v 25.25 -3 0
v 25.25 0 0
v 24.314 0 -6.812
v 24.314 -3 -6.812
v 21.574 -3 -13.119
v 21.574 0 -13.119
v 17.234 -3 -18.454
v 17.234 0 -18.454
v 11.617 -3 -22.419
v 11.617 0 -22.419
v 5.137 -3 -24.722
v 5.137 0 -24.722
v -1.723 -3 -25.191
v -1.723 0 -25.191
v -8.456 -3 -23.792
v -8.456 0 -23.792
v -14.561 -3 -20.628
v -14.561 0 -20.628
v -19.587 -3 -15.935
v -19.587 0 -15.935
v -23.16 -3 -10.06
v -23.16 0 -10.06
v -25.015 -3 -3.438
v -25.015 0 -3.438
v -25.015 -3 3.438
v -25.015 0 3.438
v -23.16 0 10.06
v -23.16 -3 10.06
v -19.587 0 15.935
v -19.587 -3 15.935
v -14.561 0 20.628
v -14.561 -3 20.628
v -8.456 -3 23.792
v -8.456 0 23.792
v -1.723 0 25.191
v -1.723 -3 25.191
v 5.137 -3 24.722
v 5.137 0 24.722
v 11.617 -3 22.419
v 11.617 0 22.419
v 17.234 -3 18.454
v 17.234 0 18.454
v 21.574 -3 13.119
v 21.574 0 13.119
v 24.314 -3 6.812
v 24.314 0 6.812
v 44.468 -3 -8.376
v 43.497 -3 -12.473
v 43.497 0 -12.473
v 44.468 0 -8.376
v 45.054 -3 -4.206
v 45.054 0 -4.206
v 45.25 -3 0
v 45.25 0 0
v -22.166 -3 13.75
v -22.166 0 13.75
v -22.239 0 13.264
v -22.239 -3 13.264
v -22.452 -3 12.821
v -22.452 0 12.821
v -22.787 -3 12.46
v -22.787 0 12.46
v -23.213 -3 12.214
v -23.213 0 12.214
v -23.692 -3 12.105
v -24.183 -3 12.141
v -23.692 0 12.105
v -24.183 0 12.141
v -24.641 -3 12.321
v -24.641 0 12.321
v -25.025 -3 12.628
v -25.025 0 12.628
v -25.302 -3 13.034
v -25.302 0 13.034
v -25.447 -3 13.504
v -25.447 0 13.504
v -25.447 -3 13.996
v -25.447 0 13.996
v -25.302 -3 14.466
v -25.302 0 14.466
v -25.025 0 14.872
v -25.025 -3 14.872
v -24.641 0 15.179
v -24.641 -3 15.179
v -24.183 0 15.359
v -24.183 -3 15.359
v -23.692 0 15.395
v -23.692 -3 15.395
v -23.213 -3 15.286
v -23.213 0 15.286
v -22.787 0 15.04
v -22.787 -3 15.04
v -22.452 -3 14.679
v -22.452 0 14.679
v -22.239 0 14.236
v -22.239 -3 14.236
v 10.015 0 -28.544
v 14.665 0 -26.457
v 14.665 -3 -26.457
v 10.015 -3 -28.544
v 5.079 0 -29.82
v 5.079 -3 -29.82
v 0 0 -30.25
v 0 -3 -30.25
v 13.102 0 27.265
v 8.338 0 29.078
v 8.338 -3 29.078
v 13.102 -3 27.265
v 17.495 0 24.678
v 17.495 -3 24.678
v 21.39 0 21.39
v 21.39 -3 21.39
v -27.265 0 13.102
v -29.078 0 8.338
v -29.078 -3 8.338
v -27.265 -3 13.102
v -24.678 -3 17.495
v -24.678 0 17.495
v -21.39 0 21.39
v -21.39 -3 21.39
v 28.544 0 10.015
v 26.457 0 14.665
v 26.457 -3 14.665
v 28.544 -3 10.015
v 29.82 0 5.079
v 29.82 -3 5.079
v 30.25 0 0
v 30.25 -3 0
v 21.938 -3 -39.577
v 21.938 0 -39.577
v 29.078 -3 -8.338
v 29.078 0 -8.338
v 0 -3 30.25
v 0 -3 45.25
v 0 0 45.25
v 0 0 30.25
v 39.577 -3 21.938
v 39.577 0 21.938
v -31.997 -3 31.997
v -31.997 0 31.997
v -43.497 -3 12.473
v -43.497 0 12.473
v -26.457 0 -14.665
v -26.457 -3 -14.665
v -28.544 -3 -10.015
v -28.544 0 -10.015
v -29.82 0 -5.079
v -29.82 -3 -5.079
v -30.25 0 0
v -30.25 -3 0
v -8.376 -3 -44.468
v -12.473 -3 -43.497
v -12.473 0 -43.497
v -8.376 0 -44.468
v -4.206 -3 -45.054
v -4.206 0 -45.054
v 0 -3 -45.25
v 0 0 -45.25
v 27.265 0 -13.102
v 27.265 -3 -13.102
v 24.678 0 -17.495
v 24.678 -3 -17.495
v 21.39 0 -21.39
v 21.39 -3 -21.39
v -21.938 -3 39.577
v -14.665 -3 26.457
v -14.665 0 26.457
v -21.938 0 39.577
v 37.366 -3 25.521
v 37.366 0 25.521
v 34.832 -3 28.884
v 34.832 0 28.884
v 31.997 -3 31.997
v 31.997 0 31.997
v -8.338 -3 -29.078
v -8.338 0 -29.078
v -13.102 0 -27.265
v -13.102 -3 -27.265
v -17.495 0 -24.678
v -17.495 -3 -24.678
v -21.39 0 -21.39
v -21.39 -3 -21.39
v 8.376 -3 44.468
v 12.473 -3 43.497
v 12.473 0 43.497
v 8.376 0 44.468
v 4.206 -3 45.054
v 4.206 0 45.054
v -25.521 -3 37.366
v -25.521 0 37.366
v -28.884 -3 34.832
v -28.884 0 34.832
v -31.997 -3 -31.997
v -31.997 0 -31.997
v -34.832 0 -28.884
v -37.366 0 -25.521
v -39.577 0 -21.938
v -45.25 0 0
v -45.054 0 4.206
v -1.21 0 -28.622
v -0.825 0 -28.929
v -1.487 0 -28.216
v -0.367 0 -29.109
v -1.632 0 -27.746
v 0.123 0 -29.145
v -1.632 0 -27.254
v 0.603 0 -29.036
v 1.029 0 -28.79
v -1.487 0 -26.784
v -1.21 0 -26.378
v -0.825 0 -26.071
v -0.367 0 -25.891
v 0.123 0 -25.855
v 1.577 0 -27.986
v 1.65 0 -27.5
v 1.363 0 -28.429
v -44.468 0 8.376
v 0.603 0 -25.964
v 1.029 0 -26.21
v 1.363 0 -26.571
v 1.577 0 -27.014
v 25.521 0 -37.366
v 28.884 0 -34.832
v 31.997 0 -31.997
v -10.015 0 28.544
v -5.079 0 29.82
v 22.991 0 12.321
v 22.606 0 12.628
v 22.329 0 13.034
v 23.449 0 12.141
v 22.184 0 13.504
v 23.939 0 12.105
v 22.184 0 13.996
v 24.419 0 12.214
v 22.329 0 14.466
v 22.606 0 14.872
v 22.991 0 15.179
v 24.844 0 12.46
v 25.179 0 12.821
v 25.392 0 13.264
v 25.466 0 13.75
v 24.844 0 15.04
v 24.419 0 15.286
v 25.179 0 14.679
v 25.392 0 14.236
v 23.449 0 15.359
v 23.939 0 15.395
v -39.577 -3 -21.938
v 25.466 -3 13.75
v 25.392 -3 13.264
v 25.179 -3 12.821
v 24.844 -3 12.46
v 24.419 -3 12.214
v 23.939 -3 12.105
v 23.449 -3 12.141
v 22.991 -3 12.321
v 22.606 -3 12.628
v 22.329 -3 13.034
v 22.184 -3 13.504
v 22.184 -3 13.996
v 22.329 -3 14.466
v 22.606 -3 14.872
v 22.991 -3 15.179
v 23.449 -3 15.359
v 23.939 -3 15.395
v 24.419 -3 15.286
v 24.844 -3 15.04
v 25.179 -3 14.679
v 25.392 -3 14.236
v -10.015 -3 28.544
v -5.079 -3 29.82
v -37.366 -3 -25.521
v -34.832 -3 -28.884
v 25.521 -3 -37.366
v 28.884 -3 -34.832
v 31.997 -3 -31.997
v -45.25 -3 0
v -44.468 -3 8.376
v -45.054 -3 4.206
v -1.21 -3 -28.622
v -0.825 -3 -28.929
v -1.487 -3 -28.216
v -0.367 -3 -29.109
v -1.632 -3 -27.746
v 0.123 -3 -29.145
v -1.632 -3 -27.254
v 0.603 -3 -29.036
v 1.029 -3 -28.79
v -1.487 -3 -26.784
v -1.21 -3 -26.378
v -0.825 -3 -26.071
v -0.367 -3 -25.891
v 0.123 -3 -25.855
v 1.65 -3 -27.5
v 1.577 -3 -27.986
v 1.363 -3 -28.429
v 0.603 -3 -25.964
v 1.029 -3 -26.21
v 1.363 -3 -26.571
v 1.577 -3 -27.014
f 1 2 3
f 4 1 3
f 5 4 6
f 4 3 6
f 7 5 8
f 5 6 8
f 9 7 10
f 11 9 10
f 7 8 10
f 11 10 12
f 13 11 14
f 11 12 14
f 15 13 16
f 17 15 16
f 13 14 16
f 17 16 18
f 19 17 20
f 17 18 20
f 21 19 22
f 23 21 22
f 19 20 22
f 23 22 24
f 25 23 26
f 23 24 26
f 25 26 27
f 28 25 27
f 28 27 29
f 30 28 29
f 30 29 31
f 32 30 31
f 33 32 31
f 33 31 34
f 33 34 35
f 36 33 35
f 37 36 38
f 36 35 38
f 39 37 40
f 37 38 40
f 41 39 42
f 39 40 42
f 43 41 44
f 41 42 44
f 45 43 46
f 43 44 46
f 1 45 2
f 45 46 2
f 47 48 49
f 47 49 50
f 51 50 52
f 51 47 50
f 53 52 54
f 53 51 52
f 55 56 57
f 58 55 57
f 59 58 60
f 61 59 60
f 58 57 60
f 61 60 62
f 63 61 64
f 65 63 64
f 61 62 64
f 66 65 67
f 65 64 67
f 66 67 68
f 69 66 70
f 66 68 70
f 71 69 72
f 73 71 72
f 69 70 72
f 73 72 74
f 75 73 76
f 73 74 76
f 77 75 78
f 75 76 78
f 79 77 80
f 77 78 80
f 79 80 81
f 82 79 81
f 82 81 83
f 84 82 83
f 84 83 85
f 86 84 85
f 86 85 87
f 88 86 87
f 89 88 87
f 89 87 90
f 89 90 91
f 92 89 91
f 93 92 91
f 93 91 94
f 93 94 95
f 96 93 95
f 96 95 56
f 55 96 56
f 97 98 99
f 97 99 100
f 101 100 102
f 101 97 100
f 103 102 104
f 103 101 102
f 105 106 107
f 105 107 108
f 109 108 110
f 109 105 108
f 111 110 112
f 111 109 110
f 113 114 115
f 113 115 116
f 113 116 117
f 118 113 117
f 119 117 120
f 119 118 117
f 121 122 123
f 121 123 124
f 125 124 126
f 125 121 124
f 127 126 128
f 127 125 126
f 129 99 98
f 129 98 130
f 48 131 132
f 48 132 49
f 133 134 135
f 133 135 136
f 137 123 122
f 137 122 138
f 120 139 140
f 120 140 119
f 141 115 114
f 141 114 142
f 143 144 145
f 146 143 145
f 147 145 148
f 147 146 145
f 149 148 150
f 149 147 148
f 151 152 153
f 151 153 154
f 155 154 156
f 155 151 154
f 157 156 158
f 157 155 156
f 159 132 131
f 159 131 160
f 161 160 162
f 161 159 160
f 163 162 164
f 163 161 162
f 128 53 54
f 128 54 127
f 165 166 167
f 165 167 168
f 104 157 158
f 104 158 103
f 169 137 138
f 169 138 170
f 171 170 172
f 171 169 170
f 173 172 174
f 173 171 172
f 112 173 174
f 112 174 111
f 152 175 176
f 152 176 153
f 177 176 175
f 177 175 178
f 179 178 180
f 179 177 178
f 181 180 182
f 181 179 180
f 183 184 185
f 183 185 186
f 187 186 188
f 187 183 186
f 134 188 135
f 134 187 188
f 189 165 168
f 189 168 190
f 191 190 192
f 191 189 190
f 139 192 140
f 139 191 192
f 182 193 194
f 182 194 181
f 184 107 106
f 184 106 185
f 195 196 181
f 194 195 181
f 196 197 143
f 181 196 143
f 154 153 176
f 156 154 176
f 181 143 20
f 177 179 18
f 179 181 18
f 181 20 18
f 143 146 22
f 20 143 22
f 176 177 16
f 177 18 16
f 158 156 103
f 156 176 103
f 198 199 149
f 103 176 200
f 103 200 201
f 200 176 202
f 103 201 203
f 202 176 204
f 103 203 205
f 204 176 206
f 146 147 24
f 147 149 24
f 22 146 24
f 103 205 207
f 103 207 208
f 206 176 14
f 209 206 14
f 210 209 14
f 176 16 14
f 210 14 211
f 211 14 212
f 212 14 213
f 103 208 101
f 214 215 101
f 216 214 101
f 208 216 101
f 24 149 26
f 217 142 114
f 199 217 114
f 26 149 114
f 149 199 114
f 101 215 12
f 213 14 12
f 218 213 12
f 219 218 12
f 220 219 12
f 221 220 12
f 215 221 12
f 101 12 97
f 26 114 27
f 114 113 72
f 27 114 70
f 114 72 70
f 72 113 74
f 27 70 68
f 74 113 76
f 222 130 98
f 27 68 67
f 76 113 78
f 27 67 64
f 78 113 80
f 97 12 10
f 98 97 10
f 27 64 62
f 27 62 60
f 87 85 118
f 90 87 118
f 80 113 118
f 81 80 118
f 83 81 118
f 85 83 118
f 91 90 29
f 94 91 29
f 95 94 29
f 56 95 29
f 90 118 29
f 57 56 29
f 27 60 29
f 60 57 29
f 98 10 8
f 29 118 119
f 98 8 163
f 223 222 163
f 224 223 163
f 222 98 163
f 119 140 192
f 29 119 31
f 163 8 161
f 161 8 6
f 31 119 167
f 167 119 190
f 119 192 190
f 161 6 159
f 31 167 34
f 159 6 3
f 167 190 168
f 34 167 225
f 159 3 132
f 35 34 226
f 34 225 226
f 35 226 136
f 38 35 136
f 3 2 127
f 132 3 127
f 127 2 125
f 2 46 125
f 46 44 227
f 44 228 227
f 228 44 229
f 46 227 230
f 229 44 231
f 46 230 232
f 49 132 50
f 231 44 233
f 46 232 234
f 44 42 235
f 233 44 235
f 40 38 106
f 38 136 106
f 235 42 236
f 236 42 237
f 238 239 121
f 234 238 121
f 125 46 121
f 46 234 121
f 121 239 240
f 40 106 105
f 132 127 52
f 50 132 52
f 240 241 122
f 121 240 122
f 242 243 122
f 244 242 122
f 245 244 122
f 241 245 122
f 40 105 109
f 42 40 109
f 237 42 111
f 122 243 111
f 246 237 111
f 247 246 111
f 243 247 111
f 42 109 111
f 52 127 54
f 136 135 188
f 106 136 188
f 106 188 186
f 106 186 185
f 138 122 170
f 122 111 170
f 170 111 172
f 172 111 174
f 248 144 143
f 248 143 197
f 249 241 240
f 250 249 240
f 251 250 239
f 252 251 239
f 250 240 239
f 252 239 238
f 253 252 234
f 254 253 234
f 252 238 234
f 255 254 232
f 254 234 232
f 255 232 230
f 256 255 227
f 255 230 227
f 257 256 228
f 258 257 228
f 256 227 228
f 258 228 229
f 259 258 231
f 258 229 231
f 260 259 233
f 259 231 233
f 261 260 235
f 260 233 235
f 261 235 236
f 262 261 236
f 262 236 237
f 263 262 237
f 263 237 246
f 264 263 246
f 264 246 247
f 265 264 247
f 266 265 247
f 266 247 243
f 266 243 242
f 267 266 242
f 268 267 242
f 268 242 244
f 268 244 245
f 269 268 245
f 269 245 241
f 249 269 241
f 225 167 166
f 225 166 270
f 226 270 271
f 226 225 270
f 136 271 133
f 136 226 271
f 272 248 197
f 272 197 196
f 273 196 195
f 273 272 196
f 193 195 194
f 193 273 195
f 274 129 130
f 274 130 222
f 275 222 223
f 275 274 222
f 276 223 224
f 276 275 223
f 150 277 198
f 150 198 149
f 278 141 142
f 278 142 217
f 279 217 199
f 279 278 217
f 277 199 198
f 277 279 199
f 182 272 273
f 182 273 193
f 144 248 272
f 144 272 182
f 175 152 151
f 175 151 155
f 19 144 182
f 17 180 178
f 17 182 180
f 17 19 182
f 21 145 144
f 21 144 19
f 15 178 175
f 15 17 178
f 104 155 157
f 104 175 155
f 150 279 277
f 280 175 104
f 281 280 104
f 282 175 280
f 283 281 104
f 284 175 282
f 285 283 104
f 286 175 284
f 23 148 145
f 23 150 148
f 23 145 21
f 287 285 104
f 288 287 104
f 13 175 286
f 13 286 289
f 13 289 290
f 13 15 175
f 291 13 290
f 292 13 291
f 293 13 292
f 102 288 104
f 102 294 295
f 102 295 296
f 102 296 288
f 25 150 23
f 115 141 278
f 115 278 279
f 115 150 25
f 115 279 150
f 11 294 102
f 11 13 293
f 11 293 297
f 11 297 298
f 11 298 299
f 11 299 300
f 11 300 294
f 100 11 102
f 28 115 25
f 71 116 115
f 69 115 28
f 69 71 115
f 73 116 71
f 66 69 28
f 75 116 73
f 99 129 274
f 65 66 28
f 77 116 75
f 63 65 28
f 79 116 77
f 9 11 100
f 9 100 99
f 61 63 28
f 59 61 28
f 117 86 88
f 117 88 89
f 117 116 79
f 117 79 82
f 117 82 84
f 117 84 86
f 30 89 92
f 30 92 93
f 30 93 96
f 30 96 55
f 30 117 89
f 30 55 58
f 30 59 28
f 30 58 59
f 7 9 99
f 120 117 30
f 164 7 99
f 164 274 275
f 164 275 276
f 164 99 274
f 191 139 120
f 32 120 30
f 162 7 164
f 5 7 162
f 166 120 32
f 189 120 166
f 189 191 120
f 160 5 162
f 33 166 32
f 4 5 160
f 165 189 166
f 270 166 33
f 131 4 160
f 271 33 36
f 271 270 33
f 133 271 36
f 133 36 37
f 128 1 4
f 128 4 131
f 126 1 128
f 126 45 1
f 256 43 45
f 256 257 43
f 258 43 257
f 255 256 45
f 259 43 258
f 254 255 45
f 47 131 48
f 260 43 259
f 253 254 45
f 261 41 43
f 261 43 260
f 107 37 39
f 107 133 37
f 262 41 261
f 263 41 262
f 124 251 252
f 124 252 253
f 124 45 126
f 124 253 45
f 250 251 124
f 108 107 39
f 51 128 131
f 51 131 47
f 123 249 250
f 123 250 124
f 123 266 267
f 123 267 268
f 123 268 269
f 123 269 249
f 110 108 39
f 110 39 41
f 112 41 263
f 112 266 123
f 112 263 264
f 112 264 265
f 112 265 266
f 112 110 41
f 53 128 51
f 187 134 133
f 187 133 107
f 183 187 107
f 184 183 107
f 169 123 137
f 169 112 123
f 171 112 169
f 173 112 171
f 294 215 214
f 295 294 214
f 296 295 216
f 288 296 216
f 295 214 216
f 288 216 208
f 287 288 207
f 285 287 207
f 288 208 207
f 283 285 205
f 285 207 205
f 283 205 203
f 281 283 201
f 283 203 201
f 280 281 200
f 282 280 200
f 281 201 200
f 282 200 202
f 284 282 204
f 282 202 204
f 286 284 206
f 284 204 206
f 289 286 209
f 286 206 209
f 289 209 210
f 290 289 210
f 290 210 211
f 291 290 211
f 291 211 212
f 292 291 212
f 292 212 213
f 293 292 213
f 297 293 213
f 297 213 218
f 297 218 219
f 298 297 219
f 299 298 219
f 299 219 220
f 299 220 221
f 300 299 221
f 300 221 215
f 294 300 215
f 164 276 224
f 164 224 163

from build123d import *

# Parameters (mm, degrees)
SKETCH1_R           = 30.25
SKETCH1_R_2         = 25.25
EXTRUDE_THIN1_DEPTH = 3
SKETCH2_R           = 1.65
CUT_EXTRUDE3_DEPTH  = 10
BOSS_EXTRUDE1_DEPTH = 3


with BuildPart() as part:
    # Sketch1 → Extrude-Thin1 (new body)
    with BuildSketch(Plane(origin=(0, 0, 0), x_dir=(1, 0, 0), z_dir=(0, 1, 0))):
        Circle(SKETCH1_R)
        Circle(SKETCH1_R_2, mode=Mode.SUBTRACT)
    extrude(amount=-EXTRUDE_THIN1_DEPTH)

    # Sketch2 → Cut-Extrude3 (cut)
    with BuildSketch(Plane(origin=(0, 0, 0), x_dir=(1, 0, 0), z_dir=(0, 1, 0))):
        with Locations((0, 27.5)):
            Circle(SKETCH2_R)
        with Locations((23.815698604, -13.75)):
            Circle(SKETCH2_R)
        with Locations((-23.815698604, -13.75)):
            Circle(SKETCH2_R)
    extrude(amount=-CUT_EXTRUDE3_DEPTH, mode=Mode.SUBTRACT)

    # Sketch5 → Boss-Extrude1 (add)
    with BuildSketch(Plane.XZ.offset(3)):
        with BuildLine():
            Line((0, 45.25), (0, 30.25))
            ThreePointArc((0, 30.25), (4.209986304, 29.955609079), (8.338030013, 29.078166302))
            Line((8.338030013, 29.078166302), (12.472590351, 43.497091741))
            ThreePointArc((12.472590351, 43.497091741), (6.297582818, 44.809630111), (0, 45.25))
        make_face()
        with BuildLine():
            Line((31.996581849, 31.996581849), (21.389980131, 21.389980131))
            ThreePointArc((21.389980131, 21.389980131), (24.158724179, 18.20490445), (26.457246141, 14.665491012))
            Line((26.457246141, 14.665491012), (39.576541748, 21.937635316))
            ThreePointArc((39.576541748, 21.937635316), (36.13825683, 27.232129798), (31.996581849, 31.996581849))
        make_face()
        with BuildLine():
            Line((45.25, 0), (30.25, 0))
            ThreePointArc((30.25, 0), (29.955609079, -4.209986304), (29.078166302, -8.338030013))
            Line((29.078166302, -8.338030013), (43.497091741, -12.472590351))
            ThreePointArc((43.497091741, -12.472590351), (44.809630111, -6.297582818), (45.25, 0))
        make_face()
        with BuildLine():
            Line((31.996581849, -31.996581849), (21.389980131, -21.389980131))
            ThreePointArc((21.389980131, -21.389980131), (18.20490445, -24.158724179), (14.665491012, -26.457246141))
            Line((14.665491012, -26.457246141), (21.937635316, -39.576541748))
            ThreePointArc((21.937635316, -39.576541748), (27.232129798, -36.13825683), (31.996581849, -31.996581849))
        make_face()
        with BuildLine():
            Line((0, -45.25), (0, -30.25))
            ThreePointArc((0, -30.25), (-4.209986304, -29.955609079), (-8.338030013, -29.078166302))
            Line((-8.338030013, -29.078166302), (-12.472590351, -43.497091741))
            ThreePointArc((-12.472590351, -43.497091741), (-6.297582818, -44.809630111), (0, -45.25))
        make_face()
        with BuildLine():
            Line((-31.996581849, -31.996581849), (-21.389980131, -21.389980131))
            ThreePointArc((-21.389980131, -21.389980131), (-24.158724179, -18.20490445), (-26.457246141, -14.665491012))
            Line((-26.457246141, -14.665491012), (-39.576541748, -21.937635316))
            ThreePointArc((-39.576541748, -21.937635316), (-36.13825683, -27.232129798), (-31.996581849, -31.996581849))
        make_face()
        with BuildLine():
            Line((-45.25, 0), (-30.25, 0))
            ThreePointArc((-30.25, 0), (-29.955609079, 4.209986304), (-29.078166302, 8.338030013))
            Line((-29.078166302, 8.338030013), (-43.497091741, 12.472590351))
            ThreePointArc((-43.497091741, 12.472590351), (-44.809630111, 6.297582818), (-45.25, 0))
        make_face()
        with BuildLine():
            Line((-31.996581849, 31.996581849), (-21.389980131, 21.389980131))
            ThreePointArc((-21.389980131, 21.389980131), (-18.20490445, 24.158724179), (-14.665491012, 26.457246141))
            Line((-14.665491012, 26.457246141), (-21.937635316, 39.576541748))
            ThreePointArc((-21.937635316, 39.576541748), (-27.232129798, 36.13825683), (-31.996581849, 31.996581849))
        make_face()
    extrude(amount=-BOSS_EXTRUDE1_DEPTH)


solid = part.part
